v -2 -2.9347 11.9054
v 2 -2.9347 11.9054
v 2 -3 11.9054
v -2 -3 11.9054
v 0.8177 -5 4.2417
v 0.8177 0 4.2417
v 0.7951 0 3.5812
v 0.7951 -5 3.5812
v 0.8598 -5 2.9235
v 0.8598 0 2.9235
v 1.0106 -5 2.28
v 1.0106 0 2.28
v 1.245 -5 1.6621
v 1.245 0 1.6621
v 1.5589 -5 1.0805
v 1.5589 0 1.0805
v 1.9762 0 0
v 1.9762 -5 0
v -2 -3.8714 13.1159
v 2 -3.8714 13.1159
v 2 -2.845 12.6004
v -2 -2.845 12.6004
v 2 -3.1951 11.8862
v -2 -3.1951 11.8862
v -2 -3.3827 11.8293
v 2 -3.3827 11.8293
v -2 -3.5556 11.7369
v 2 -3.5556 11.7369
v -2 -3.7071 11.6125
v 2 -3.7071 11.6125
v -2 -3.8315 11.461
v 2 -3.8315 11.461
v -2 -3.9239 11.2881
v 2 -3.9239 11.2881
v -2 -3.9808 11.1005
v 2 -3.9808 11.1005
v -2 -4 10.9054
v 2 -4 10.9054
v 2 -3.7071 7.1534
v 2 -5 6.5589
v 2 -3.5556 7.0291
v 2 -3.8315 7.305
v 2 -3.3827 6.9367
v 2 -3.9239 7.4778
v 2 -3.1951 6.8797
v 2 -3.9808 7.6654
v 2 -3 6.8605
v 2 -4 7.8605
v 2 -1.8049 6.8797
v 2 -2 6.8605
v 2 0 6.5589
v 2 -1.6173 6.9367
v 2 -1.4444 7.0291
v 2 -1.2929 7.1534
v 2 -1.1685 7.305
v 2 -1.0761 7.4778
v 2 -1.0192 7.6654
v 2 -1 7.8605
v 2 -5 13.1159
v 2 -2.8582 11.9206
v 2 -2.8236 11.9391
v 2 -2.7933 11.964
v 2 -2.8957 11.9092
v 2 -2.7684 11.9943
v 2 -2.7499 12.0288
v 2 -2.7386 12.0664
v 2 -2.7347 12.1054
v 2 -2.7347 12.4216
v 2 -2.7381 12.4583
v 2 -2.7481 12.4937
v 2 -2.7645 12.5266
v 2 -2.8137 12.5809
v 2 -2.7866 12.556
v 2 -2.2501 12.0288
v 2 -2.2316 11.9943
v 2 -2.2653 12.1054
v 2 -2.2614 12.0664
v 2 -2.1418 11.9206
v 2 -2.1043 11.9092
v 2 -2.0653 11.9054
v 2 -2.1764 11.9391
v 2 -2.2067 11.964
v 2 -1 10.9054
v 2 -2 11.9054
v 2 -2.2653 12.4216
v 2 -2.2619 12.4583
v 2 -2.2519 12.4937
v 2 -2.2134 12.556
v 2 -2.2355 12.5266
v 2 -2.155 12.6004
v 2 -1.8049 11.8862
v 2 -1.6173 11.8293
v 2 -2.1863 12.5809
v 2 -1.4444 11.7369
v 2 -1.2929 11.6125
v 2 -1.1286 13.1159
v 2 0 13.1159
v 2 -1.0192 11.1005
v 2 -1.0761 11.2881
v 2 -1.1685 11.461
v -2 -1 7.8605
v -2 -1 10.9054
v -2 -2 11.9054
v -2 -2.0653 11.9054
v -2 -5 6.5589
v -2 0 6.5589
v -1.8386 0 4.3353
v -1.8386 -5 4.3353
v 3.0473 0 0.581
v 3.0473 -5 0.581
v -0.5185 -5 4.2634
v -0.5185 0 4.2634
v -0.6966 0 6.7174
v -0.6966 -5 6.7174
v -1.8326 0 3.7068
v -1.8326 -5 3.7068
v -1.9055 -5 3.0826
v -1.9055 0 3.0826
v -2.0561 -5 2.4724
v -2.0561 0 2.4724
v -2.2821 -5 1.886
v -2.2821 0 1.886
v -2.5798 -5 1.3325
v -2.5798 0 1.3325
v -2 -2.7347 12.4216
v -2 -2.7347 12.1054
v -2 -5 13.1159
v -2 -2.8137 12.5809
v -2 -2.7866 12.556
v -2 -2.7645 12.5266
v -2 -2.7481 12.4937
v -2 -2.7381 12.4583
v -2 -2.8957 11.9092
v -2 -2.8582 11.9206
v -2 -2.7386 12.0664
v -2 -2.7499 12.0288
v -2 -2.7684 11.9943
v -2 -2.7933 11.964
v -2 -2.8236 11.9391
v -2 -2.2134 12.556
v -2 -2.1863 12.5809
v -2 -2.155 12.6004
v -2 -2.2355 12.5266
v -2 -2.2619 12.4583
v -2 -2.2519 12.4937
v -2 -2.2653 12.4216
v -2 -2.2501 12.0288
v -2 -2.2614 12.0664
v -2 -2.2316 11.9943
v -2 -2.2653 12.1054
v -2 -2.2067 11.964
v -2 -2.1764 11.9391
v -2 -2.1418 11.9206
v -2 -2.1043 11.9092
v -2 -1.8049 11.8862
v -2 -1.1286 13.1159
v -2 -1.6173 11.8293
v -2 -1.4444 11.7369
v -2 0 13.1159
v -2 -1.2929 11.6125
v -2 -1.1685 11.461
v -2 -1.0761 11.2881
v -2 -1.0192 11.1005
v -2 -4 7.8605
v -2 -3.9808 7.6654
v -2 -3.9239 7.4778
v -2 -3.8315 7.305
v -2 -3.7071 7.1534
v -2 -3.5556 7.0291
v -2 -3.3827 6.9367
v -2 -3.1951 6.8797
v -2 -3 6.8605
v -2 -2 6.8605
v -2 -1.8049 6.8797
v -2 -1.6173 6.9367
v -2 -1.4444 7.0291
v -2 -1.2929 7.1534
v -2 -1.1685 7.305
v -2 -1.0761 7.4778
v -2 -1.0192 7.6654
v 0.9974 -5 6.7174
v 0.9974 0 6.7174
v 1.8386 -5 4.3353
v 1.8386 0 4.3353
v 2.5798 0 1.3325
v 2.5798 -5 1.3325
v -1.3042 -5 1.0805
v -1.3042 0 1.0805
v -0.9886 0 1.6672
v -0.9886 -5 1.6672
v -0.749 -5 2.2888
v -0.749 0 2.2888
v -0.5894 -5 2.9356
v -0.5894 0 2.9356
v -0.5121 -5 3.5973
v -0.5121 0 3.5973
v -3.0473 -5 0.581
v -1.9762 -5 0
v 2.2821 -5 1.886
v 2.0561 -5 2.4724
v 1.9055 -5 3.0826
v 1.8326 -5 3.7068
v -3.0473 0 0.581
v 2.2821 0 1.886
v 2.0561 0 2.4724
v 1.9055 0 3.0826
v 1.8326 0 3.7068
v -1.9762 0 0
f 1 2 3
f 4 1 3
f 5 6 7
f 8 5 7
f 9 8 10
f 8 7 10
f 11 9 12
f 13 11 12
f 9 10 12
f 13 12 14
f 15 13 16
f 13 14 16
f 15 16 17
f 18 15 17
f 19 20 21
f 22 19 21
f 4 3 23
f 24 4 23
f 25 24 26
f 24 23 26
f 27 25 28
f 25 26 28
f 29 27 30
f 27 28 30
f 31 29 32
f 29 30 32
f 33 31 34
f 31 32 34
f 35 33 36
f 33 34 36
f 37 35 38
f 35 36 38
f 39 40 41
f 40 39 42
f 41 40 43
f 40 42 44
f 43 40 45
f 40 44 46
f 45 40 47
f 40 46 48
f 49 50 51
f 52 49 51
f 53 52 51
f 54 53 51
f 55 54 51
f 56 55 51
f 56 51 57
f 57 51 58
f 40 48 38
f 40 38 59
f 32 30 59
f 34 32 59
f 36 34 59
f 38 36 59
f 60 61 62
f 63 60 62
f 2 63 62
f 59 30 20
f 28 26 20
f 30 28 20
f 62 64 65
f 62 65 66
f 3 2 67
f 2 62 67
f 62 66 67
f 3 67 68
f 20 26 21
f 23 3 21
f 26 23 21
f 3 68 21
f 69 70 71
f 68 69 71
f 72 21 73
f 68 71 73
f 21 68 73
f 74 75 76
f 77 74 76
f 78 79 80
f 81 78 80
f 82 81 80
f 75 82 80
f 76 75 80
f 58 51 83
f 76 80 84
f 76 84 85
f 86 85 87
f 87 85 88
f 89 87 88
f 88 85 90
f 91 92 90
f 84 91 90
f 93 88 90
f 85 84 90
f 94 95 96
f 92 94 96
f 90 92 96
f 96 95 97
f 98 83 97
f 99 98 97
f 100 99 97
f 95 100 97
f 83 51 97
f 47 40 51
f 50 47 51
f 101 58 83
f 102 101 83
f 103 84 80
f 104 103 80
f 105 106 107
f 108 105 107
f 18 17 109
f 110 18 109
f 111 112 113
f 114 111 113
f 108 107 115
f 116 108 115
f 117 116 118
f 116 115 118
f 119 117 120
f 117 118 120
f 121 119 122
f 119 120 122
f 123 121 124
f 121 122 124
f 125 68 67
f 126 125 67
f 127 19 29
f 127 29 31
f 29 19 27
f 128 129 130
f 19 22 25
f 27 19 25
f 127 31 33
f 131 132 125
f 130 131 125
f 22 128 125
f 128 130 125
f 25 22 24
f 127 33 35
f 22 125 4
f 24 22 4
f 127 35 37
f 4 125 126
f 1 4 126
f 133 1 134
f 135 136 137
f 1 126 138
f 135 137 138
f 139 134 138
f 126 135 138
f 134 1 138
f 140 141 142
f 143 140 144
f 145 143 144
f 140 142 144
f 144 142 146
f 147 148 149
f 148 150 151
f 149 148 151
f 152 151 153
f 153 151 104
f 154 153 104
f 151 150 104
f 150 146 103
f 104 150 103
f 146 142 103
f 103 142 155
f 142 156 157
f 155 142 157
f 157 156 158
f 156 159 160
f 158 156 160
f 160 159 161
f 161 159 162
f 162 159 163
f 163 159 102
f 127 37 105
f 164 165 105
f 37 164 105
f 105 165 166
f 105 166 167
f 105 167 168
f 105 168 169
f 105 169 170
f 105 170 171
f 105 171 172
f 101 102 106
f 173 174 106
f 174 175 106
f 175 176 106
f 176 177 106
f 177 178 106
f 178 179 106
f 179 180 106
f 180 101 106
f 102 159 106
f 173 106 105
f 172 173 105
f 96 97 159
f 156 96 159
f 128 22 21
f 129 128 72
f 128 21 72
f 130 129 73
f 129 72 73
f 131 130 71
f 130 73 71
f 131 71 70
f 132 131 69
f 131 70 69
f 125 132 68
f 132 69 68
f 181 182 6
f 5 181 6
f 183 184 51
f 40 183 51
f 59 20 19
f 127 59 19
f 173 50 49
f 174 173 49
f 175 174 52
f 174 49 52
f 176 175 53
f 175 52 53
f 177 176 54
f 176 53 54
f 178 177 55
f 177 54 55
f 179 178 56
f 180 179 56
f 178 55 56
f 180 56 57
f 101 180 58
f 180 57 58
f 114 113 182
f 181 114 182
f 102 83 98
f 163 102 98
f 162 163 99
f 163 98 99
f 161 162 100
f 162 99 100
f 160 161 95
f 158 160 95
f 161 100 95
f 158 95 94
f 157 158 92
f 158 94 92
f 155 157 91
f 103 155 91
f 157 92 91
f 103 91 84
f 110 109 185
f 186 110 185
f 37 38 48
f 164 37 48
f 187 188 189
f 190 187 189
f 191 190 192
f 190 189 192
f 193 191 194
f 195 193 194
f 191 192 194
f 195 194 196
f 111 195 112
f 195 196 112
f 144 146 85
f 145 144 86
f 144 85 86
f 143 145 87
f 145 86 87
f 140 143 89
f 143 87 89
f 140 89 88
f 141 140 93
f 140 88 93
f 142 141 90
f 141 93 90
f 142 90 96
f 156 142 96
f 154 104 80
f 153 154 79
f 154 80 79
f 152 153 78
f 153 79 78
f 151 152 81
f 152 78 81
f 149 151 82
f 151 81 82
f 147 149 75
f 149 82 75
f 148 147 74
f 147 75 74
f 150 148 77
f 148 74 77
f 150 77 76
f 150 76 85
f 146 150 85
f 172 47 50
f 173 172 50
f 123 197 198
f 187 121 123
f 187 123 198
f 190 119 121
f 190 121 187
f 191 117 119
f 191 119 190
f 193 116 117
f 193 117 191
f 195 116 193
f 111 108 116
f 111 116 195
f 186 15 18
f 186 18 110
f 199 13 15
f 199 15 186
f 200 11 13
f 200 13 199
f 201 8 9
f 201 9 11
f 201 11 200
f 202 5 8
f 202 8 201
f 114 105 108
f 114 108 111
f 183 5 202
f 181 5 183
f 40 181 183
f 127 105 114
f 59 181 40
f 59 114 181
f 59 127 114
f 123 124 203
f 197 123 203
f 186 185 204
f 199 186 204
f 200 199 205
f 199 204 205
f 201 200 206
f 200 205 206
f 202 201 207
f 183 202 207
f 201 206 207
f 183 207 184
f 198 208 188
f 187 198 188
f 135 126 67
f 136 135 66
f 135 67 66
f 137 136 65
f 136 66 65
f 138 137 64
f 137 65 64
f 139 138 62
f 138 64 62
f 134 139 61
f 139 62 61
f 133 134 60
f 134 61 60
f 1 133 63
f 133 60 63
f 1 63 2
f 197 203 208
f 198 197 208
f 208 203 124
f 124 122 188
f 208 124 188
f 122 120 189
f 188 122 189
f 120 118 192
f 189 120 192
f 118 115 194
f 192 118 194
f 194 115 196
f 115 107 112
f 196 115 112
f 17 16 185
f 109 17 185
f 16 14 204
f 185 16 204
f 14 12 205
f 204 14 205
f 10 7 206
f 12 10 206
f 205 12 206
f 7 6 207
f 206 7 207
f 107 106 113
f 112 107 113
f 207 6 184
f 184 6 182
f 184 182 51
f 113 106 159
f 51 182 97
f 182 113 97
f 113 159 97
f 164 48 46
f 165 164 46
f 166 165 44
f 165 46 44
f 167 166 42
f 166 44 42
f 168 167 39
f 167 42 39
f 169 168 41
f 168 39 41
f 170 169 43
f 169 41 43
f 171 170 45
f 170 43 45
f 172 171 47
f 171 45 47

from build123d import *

# Parameters (mm, degrees)
F1_DEPTH = 5
F3_DEPTH = 5.048269


with BuildPart() as f1:
    # F0 (on Front) → F1 (new body)
    with BuildSketch(Plane.XZ):
        with BuildLine():
            Line((0, 13.115867), (-2, 13.115867))
            Line((-2, 13.115867), (-2, 6.558903))
            Line((-2, 6.558903), (-1.838625, 4.335265))
            ThreePointArc((-1.838625, 4.335265), (-1.97121, 2.77512), (-2.579833, 1.33248))
            Line((-2.579833, 1.33248), (-3.047269, 0.580993))
            Line((-3.047269, 0.580993), (-1.976246, 0))
            Line((-1.976246, 0), (-1.304174, 1.080476))
            ThreePointArc((-1.304174, 1.080476), (-0.659034, 2.609675), (-0.518494, 4.263429))
            Line((-0.518494, 4.263429), (-0.696581, 6.717356))
            Line((-0.696581, 6.717356), (0, 6.717356))
            Line((0, 6.717356), (0, 13.115867))
        make_face()
        with BuildLine():
            Line((2, 13.115867), (0, 13.115867))
            Line((0, 13.115867), (0, 6.717356))
            Line((0, 6.717356), (0.99737, 6.717356))
            Line((0.99737, 6.717356), (0.817707, 4.241714))
            ThreePointArc((0.817707, 4.241714), (0.924554, 2.599253), (1.558914, 1.080476))
            Line((1.558914, 1.080476), (1.976246, 0))
            Line((1.976246, 0), (3.047269, 0.580993))
            Line((3.047269, 0.580993), (2.579833, 1.33248))
            ThreePointArc((2.579833, 1.33248), (1.97121, 2.77512), (1.838625, 4.335265))
            Line((1.838625, 4.335265), (2, 6.558903))
            Line((2, 6.558903), (2, 13.115867))
        make_face()
    extrude(amount=F1_DEPTH)

    # F2 (on face) → F3 (cut, through all)
    with BuildSketch(Plane.YZ.offset(2)):
        with BuildLine():
            ThreePointArc((-2.844955, 12.600366), (-2.764493, 12.526635), (-2.734718, 12.421641))
            Line((-2.734718, 12.421641), (-2.734718, 12.105381))
            ThreePointArc((-2.734718, 12.105381), (-2.793296, 11.963959), (-2.934718, 11.905381))
            Line((-2.934718, 11.905381), (-3, 11.905381))
            ThreePointArc((-3, 11.905381), (-3.707107, 11.612487), (-4, 10.905381))
            Line((-4, 10.905381), (-4, 7.860531))
            ThreePointArc((-4, 7.860531), (-3.707107, 7.153424), (-3, 6.860531))
            Line((-3, 6.860531), (-2.5, 6.860531))
            Line((-2.5, 6.860531), (-2, 6.860531))
            ThreePointArc((-2, 6.860531), (-1.292893, 7.153424), (-1, 7.860531))
            Line((-1, 7.860531), (-1, 10.905381))
            ThreePointArc((-1, 10.905381), (-1.292893, 11.612487), (-2, 11.905381))
            Line((-2, 11.905381), (-2.065282, 11.905381))
            ThreePointArc((-2.065282, 11.905381), (-2.206704, 11.963959), (-2.265282, 12.105381))
            Line((-2.265282, 12.105381), (-2.265282, 12.421641))
            ThreePointArc((-2.265282, 12.421641), (-2.235507, 12.526635), (-2.155045, 12.600366))
            Line((-2.155045, 12.600366), (-1.128649, 13.115867))
            Line((-1.128649, 13.115867), (-2.5, 13.115867))
            Line((-2.5, 13.115867), (-3.871351, 13.115867))
            Line((-3.871351, 13.115867), (-2.844955, 12.600366))
        make_face()
    extrude(amount=-F3_DEPTH, mode=Mode.SUBTRACT)


solid = f1.part
